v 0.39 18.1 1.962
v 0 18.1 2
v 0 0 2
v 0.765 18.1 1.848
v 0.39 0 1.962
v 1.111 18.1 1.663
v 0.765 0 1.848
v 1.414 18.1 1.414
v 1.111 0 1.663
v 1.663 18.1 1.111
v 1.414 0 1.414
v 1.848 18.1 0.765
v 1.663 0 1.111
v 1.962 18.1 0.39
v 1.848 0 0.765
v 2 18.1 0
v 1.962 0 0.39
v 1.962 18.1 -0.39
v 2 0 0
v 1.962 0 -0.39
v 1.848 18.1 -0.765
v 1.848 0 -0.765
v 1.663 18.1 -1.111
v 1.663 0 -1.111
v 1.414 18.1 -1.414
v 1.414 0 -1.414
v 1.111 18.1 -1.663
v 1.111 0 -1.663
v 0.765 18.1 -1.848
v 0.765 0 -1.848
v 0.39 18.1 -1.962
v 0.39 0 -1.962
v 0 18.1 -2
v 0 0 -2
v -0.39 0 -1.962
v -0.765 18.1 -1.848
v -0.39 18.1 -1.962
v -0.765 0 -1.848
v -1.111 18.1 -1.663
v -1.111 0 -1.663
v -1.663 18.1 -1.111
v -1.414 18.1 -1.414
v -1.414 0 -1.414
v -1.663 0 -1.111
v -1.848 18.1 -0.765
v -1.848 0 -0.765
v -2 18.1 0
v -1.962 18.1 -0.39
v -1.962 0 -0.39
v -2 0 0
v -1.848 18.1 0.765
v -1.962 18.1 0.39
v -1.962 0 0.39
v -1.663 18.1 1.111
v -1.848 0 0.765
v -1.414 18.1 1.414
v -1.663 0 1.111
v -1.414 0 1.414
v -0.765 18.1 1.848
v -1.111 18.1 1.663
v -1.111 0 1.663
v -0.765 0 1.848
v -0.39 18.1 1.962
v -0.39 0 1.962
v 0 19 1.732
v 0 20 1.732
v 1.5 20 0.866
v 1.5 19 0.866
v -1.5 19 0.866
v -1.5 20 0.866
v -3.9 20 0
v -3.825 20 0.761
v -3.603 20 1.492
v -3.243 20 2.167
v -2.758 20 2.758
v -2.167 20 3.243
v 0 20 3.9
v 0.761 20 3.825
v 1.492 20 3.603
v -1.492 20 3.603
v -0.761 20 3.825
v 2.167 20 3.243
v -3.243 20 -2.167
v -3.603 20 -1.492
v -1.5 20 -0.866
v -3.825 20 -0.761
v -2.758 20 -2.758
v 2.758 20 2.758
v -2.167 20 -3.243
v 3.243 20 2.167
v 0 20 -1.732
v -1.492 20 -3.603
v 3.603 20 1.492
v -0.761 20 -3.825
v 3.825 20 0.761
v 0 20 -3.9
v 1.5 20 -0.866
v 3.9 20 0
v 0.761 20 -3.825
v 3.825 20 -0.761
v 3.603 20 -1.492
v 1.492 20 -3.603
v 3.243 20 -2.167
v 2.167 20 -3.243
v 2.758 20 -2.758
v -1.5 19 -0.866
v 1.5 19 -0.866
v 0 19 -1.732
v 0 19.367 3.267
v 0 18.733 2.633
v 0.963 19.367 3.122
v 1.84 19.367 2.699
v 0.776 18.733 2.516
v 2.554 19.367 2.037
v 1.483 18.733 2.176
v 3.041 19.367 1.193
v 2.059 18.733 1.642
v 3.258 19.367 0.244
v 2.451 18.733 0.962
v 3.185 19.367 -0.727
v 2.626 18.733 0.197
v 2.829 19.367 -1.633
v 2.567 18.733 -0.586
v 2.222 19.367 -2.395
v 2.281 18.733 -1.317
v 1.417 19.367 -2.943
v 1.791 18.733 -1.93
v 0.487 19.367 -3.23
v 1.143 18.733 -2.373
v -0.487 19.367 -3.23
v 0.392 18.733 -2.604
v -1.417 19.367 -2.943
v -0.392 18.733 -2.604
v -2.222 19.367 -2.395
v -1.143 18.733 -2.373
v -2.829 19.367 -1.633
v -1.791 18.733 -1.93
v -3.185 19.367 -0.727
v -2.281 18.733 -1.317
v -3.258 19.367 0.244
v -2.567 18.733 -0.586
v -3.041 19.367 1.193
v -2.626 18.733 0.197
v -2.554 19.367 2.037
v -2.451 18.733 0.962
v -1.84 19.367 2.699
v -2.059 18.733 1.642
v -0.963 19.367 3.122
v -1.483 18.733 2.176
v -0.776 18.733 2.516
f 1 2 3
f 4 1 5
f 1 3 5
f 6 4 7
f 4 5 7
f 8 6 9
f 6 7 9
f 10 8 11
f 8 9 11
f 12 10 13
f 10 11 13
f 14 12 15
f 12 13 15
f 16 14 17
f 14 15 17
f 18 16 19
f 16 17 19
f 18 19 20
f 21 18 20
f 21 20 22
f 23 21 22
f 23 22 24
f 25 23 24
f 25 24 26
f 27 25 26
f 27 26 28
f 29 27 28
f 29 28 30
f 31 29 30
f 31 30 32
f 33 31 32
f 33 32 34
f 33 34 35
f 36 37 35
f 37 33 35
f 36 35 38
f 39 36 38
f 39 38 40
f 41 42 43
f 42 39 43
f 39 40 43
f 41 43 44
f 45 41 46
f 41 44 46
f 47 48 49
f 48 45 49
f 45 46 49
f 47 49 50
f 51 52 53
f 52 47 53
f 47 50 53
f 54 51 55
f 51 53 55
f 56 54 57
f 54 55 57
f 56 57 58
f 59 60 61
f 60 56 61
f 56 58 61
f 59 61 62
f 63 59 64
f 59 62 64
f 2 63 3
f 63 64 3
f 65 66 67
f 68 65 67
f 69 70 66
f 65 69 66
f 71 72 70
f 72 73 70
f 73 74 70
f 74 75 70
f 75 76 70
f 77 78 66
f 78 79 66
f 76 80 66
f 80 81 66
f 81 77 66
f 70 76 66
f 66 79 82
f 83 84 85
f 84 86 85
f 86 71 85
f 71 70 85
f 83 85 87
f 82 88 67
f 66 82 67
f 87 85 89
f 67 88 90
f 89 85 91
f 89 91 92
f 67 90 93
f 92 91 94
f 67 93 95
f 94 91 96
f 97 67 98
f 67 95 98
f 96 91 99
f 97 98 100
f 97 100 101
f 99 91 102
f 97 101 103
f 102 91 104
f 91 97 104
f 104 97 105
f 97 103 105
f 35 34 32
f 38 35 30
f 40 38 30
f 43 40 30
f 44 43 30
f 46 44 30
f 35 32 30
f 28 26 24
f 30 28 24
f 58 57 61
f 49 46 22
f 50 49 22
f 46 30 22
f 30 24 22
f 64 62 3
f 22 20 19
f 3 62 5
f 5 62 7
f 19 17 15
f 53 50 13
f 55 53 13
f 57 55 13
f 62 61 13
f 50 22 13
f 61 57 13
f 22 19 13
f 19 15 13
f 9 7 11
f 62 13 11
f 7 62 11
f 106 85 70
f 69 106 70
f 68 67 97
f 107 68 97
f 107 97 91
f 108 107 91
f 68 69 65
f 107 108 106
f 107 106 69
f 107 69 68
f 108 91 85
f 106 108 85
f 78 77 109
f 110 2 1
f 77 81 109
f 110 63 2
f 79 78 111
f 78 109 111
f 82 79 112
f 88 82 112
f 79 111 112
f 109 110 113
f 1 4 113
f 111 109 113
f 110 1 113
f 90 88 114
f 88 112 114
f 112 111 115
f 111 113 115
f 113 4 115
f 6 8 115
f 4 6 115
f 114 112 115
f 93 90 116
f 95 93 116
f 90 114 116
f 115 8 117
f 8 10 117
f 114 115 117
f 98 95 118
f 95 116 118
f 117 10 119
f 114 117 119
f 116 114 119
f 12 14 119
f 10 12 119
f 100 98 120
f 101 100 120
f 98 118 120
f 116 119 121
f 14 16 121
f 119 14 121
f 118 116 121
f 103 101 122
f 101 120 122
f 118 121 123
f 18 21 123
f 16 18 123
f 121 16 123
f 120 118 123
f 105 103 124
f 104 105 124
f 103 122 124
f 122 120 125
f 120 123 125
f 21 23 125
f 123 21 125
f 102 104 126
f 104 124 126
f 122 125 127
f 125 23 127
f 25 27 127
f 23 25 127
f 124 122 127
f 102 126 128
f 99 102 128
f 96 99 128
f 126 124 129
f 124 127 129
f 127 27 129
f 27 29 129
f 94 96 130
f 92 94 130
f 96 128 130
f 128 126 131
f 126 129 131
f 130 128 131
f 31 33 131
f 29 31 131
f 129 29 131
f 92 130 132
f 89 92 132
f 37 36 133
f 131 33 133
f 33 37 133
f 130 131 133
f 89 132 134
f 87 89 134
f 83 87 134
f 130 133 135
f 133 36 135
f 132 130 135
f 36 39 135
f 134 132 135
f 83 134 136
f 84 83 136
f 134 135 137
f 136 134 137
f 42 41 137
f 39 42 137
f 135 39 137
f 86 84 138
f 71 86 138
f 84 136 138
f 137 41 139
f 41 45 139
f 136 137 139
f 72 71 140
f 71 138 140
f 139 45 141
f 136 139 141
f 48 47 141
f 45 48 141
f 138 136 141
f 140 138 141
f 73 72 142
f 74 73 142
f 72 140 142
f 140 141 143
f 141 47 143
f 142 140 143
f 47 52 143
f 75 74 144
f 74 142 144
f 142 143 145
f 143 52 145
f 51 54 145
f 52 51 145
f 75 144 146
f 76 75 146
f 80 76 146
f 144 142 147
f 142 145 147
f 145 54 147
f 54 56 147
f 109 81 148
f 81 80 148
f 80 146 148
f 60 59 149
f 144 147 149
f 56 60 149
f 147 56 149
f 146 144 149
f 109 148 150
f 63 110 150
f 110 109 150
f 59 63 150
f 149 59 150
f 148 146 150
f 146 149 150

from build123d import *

# Parameters (mm, degrees)
SKETCH1_R           = 2
BOSS_EXTRUDE1_DEPTH = 20
CUT_EXTRUDE1_DEPTH  = 1


with BuildPart() as part:
    # Sketch1 → Boss-Extrude1 (new body)
    with BuildSketch(Plane(origin=(0, 0, 0), x_dir=(1, 0, 0), z_dir=(0, 1, 0))):
        with Locations(Location((0, 0, 0), (0, 0, 270))):
            Circle(SKETCH1_R)
    extrude(amount=BOSS_EXTRUDE1_DEPTH)

    # Sketch3 → Revolve1 (revolve)
    with BuildSketch(Plane(origin=(0, 0, 0), x_dir=(0, 0, -1), z_dir=(1, 0, 0)), mode=Mode.PRIVATE) as revolve1_sk:
        Polygon((0, 20), (3.9, 20), (0, 16.1), align=None)
    revolve(revolve1_sk.sketch.rotate(Axis((0, 16.1, 0), (0, 1, 0)), 180), axis=Axis((0, 16.1, 0), (0, 1, 0)))

    # Sketch4 → Cut-Extrude1 (cut)
    with BuildSketch(Plane(origin=(0, 20, 0), x_dir=(1, 0, 0), z_dir=(0, 1, 0))):
        Polygon((0, 1.732050808), (-1.5, 0.866025404), (-1.5, -0.866025404), (0, -1.732050808), (1.5, -0.866025404), (1.5, 0.866025404), align=None)
    extrude(amount=-CUT_EXTRUDE1_DEPTH, mode=Mode.SUBTRACT)


solid = part.part
